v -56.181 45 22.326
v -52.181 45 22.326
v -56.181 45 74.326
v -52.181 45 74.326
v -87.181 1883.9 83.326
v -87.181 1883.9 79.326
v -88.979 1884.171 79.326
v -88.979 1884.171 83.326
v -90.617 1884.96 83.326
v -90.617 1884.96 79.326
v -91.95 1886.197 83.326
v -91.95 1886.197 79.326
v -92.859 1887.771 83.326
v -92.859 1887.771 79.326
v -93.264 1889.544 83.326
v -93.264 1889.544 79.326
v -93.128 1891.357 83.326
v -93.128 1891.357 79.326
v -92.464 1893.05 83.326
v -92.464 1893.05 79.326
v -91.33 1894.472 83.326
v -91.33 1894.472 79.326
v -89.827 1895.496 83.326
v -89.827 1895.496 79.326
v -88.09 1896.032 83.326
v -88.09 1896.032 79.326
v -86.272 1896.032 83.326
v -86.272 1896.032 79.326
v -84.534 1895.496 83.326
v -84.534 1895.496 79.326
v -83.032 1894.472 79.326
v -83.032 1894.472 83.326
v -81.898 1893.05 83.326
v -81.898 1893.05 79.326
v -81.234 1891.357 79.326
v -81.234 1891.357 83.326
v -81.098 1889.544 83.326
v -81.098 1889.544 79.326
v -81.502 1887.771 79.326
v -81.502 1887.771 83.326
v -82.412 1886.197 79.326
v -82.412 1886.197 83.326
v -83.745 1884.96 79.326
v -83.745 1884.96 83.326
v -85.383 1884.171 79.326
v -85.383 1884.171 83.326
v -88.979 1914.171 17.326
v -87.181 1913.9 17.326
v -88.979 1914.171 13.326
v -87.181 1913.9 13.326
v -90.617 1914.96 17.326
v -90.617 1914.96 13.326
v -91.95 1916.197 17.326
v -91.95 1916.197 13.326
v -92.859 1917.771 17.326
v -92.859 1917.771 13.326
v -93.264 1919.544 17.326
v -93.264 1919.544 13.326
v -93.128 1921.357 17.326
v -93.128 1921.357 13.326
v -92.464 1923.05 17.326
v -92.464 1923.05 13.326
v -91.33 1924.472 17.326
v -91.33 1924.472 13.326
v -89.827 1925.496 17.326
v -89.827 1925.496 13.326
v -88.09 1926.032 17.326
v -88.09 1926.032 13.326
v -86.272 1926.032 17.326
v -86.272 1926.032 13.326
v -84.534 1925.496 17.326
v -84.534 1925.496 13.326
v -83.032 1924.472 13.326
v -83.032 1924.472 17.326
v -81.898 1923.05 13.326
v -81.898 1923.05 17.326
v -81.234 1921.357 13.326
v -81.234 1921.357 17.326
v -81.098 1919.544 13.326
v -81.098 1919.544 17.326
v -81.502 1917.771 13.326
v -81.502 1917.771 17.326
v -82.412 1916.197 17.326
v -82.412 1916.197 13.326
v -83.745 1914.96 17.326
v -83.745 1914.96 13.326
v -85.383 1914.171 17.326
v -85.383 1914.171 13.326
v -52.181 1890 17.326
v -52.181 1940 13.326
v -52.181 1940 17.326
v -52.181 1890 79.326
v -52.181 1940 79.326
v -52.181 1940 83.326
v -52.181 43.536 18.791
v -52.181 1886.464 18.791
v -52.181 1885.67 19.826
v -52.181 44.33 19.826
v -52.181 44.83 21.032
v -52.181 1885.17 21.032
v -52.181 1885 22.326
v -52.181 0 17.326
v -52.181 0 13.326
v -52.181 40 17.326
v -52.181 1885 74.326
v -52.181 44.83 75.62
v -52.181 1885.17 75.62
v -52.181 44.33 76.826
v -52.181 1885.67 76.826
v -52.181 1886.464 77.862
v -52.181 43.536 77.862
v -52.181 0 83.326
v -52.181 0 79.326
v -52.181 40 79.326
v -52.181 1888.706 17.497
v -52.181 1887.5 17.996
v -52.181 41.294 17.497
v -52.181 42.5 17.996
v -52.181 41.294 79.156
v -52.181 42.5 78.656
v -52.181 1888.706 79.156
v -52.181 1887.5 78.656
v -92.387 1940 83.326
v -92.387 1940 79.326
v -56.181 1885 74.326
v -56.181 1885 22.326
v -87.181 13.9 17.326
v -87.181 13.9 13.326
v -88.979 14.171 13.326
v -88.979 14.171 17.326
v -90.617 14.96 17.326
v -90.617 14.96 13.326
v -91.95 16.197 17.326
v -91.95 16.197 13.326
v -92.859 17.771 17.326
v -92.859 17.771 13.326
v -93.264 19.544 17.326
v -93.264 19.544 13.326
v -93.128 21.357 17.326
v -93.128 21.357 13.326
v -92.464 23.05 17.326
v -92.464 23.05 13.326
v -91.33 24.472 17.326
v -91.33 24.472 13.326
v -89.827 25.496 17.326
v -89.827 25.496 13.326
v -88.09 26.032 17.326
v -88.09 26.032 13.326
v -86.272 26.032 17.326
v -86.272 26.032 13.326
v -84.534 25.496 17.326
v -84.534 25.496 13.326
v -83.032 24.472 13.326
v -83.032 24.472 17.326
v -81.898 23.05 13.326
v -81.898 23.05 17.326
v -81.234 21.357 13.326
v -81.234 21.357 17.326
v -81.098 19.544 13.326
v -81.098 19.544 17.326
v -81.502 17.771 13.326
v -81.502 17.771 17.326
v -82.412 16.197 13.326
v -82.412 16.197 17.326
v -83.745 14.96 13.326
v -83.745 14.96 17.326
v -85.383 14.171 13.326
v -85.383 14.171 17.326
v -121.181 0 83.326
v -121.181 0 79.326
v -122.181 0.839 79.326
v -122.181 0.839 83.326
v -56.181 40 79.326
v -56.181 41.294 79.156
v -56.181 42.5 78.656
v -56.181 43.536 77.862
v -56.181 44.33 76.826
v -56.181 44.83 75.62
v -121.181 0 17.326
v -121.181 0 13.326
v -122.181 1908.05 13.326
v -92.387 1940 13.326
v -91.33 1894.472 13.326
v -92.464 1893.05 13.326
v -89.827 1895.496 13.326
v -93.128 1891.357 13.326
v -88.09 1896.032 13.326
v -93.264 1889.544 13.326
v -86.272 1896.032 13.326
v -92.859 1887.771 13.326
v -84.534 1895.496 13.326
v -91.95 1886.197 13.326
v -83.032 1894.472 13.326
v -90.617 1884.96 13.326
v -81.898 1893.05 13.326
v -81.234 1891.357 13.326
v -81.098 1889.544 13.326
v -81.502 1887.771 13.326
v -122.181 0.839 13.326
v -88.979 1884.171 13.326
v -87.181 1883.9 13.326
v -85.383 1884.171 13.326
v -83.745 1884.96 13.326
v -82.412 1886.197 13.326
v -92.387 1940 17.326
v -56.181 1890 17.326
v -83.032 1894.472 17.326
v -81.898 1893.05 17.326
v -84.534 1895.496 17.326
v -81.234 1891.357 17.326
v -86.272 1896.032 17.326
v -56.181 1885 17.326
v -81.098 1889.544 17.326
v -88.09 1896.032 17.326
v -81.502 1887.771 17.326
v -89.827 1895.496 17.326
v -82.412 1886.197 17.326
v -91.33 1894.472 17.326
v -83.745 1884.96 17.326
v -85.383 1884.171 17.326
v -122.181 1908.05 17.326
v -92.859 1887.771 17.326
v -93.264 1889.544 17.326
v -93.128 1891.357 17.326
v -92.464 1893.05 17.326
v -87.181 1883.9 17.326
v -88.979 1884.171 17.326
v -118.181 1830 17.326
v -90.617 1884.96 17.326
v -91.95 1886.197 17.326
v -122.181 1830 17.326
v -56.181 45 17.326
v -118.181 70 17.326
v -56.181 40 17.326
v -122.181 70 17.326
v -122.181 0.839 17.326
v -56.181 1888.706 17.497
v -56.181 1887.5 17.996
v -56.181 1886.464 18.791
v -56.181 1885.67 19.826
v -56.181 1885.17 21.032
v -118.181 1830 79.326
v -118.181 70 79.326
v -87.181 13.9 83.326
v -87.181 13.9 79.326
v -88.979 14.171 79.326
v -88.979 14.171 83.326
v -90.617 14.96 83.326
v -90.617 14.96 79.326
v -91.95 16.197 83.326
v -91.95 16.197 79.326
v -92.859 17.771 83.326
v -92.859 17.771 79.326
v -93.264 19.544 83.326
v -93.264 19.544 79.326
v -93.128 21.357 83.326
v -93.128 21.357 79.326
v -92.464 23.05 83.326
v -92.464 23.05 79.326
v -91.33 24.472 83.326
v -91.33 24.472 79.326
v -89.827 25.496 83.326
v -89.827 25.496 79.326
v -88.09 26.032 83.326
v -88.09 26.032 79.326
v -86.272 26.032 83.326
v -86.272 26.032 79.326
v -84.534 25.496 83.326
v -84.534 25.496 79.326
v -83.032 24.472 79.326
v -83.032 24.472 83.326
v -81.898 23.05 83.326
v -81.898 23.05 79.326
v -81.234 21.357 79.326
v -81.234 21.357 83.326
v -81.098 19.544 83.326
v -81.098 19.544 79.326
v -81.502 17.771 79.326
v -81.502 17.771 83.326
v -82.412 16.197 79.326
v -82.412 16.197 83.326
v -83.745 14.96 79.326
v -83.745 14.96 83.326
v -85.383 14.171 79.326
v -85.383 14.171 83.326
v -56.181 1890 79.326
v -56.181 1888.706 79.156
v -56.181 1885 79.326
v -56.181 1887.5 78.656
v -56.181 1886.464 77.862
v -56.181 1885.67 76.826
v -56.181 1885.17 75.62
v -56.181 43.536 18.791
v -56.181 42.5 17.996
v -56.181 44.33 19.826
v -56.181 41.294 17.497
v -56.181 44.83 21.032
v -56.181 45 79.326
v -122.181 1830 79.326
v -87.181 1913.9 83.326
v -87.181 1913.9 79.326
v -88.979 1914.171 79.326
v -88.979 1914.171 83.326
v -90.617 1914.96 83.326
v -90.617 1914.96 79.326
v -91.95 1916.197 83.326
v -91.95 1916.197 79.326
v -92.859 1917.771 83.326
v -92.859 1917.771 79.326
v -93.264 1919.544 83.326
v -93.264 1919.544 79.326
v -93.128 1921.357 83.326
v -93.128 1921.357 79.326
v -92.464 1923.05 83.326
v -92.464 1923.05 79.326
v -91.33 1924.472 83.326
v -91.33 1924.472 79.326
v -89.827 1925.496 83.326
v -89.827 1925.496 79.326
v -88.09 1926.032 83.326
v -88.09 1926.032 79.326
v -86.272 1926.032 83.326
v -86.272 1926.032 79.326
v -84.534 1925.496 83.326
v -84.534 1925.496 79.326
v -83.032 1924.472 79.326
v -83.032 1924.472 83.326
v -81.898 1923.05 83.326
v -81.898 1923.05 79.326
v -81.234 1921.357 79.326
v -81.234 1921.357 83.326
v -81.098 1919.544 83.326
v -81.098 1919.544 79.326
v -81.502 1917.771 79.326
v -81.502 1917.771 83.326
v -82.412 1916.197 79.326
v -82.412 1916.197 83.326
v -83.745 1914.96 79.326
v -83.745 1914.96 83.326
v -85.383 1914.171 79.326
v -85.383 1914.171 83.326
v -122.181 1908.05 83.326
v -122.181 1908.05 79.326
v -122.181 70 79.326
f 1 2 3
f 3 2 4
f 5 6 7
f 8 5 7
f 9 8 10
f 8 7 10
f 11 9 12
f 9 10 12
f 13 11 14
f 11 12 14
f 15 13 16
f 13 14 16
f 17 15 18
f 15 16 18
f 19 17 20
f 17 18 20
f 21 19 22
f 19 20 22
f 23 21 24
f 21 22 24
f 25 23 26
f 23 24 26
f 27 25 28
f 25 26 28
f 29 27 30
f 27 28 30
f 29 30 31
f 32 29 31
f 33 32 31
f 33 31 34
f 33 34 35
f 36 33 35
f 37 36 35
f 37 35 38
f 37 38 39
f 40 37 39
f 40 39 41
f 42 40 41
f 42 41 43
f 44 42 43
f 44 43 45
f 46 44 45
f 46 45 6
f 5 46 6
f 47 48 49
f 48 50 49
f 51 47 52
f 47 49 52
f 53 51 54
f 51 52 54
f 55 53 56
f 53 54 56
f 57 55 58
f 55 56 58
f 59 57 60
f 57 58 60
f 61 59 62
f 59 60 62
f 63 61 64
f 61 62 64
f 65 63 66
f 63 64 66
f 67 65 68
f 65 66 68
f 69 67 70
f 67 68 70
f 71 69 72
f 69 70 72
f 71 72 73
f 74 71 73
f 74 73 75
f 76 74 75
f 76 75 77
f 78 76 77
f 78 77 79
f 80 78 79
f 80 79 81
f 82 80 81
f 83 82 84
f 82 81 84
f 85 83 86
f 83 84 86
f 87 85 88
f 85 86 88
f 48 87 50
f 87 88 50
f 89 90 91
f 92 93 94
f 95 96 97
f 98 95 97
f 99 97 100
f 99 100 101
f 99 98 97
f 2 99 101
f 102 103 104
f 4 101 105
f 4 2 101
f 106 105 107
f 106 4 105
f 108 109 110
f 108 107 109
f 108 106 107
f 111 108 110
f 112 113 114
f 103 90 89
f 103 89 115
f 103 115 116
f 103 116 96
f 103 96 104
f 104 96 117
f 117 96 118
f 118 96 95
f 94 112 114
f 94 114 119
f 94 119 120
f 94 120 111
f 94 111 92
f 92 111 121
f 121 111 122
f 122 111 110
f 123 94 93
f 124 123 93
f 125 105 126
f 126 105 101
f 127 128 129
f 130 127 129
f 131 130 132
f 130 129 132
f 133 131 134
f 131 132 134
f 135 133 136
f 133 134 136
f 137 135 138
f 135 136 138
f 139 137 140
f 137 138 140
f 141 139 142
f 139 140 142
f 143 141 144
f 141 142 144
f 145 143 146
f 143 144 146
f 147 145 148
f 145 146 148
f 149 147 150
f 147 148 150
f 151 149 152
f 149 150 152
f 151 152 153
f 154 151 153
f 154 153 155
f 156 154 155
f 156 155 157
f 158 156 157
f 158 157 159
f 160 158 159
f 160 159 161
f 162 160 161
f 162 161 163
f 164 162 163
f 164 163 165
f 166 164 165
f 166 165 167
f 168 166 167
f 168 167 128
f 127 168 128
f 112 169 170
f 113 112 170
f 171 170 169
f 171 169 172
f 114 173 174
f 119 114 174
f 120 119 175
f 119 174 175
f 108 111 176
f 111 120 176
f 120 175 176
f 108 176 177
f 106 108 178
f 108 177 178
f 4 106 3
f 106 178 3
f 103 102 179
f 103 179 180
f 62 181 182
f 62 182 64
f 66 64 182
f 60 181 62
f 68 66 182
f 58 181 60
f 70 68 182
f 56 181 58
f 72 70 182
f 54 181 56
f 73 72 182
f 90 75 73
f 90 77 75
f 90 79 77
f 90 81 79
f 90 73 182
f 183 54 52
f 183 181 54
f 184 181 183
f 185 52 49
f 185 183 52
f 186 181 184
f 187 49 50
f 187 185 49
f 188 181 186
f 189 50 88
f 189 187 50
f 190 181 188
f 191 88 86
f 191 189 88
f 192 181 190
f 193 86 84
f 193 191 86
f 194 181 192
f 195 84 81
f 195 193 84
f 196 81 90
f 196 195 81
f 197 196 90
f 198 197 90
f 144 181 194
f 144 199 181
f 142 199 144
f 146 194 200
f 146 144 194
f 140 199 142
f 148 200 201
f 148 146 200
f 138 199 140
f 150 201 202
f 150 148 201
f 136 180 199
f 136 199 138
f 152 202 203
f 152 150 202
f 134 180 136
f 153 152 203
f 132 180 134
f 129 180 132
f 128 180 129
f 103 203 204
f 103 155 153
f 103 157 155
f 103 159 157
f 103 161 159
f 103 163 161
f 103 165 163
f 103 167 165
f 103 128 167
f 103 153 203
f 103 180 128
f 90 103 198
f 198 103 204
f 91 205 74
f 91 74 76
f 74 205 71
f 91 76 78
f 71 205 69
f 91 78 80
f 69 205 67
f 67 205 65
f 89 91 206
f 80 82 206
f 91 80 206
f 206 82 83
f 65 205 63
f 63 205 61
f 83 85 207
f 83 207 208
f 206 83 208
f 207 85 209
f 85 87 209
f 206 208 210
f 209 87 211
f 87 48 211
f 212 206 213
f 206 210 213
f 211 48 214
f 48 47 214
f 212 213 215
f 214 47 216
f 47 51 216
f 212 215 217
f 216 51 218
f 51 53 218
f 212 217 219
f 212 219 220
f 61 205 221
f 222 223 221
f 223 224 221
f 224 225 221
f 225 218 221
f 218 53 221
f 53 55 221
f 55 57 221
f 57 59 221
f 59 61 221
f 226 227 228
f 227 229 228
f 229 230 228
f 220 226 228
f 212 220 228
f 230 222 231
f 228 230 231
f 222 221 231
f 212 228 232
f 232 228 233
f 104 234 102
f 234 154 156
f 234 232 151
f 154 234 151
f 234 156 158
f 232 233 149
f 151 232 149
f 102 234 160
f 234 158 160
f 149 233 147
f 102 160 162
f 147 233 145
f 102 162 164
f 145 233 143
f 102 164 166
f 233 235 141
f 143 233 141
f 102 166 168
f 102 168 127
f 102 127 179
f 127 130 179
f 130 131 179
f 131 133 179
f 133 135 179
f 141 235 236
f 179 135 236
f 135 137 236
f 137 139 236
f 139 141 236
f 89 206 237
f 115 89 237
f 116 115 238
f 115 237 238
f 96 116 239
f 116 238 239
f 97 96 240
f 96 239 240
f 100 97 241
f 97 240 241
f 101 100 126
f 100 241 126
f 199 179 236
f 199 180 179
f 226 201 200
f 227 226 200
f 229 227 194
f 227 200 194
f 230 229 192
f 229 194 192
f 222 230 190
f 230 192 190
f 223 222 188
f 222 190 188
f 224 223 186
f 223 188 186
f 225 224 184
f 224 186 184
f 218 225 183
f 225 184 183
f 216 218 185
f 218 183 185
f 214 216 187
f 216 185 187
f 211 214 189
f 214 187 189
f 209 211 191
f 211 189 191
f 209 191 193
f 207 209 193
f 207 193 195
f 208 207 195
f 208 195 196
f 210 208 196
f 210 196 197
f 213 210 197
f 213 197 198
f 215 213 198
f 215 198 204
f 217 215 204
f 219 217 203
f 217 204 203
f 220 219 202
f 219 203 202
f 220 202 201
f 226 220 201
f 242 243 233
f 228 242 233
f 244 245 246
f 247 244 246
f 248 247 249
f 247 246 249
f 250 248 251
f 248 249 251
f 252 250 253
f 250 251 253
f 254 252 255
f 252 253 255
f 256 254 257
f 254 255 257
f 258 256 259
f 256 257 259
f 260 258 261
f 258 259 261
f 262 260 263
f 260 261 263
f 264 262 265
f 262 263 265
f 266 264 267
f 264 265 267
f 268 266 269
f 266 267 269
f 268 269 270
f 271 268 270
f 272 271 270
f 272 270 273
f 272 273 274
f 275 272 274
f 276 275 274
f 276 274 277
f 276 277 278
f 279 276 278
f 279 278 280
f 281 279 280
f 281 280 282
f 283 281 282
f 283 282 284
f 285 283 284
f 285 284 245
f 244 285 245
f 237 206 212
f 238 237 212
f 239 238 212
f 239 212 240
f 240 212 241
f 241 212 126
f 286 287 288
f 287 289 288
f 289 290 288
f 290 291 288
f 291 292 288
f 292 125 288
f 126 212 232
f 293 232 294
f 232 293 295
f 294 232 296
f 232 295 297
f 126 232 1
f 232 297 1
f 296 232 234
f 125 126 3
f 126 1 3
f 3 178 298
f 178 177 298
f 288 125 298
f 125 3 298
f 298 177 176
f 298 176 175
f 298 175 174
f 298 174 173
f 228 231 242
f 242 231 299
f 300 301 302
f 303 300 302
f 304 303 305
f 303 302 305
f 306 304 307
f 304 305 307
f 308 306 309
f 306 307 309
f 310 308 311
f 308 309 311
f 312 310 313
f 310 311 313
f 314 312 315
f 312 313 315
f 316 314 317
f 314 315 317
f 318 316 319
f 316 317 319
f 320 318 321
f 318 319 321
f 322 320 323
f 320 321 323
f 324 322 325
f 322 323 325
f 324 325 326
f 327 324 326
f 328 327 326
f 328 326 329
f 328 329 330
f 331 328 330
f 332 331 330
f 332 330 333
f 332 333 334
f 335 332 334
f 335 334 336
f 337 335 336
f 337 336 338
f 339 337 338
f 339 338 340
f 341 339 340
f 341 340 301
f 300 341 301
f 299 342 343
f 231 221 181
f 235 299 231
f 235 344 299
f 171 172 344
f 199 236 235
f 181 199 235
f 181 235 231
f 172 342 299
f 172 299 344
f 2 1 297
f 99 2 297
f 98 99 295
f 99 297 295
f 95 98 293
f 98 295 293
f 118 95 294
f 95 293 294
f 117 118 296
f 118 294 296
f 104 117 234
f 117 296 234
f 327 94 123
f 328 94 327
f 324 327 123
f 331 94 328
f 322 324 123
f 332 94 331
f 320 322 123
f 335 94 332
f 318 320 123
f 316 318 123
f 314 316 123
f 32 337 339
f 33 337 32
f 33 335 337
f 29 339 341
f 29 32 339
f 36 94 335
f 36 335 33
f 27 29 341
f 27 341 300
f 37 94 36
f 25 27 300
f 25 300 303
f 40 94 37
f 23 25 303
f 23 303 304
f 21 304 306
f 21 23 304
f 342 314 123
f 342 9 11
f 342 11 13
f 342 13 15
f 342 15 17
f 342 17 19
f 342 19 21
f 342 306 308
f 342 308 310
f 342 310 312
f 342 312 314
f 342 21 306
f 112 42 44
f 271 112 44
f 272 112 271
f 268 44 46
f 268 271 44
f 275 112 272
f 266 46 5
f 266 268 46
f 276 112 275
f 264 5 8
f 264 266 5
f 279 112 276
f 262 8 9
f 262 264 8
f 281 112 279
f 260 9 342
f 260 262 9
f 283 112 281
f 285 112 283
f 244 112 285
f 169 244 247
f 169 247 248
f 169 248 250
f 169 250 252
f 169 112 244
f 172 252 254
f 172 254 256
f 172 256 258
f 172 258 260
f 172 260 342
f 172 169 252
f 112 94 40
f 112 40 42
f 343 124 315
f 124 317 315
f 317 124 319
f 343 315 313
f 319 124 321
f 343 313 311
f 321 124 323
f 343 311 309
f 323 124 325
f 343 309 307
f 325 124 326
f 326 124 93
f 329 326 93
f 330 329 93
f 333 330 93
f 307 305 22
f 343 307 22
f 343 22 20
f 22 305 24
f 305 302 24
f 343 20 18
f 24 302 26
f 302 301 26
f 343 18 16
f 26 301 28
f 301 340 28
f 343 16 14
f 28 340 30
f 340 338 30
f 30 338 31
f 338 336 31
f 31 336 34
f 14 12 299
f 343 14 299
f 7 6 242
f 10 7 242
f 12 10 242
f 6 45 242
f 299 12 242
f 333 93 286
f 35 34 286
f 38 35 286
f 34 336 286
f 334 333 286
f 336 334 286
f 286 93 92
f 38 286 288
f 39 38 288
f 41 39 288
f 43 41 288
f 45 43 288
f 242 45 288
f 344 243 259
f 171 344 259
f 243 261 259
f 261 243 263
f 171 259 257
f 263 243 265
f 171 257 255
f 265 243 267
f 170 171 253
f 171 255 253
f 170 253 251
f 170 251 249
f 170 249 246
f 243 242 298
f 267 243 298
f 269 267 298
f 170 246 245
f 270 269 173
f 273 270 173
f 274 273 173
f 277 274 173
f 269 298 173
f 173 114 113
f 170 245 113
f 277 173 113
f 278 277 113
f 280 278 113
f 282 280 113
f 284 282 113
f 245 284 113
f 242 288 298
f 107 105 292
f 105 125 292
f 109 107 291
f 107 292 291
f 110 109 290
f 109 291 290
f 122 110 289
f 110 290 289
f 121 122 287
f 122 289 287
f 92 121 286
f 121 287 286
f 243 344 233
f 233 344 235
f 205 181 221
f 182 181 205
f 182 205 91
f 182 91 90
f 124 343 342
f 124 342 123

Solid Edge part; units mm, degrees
sketch "Sketch1" plane through (0, 0, 0) normal (0, -1, 0) x (1, 0, 0)
  line L0 (-122.1808, 13.3262) -> (-52.1808, 13.3262)
  line L1 (-52.1808, 13.3262) -> (-52.1808, 83.3262)
  line L2 (-52.1808, 83.3262) -> (-122.1808, 83.3262)
  line L3 (-122.1808, 83.3262) -> (-122.1808, 13.3262)
  line L4 (-118.1808, 17.3262) -> (-56.1808, 17.3262)
  line L5 (-56.1808, 17.3262) -> (-56.1808, 79.3262)
  line L6 (-56.1808, 79.3262) -> (-118.1808, 79.3262)
  line L7 (-118.1808, 79.3262) -> (-118.1808, 17.3262)
  dimension "D1" = 70
  dimension "D2" = 70
  dimension "D3" = 4
  dimension "D4" = 4
extrude "Protrusion1" add sketch "Sketch1" against normal blind 1940
sketch "Sketch2" plane through (-87.1808, 1079, 13.3262) normal (0, 0, -1) x (0, -1, 0)
  circle A0 centre (-811, 0) radius 6.1
  circle A1 centre (-841, 0) radius 6.1
  circle A2 centre (1059, 0) radius 6.1
  dimension "D1" = 12.2
  dimension "D2" = 20
  dimension "D3" = 12.2
  dimension "D4" = 12.2
  dimension "D5" = 20
  dimension "D6" = 30
extrude "Cutout1" cut sketch "Sketch2" against normal through all
sketch "Sketch3" plane through (-52.1808, 1079, 63.3262) normal (1, 0, 0) x (0, -1, 0)
  line L0 (1034, -16) -> (1079, -16)
  line L1 (1079, -16) -> (1079, 46)
  line L2 (1079, 46) -> (1034, 46)
  line L3 (1034, 46) -> (1034, -16)
  line L4 (-861, -16) -> (-806, -16)
  line L5 (-806, -16) -> (-806, 46)
  line L6 (-806, 46) -> (-861, 46)
  line L7 (-861, 46) -> (-861, -16)
  dimension "D1" = 62
  dimension "D2" = 55
  dimension "D3" = 45
  dimension "D4" = 62
extrude "Cutout2" cut sketch "Sketch3" against normal up to next
sketch "Sketch4" plane through (-92.1808, 1005.1, 13.3262) normal (0, 0, -1) x (0, -1, 0)
  line L0 (-934.9, 30) -> (-902.95, 30)
  line L1 (-902.95, 30) -> (-934.9, 0.2062)
  line L2 (-934.9, 0.2062) -> (-934.9, 30)
  dimension "D1" = 29.7938
extrude "Cutout3" cut sketch "Sketch4" against normal through all
sketch "Sketch5" plane through (-92.1808, 1005.1, 13.3262) normal (0, 0, -1) x (0, 1, 0)
  line L0 (-1005.1, -29) -> (-1004.2609, -30)
  line L1 (-1004.2609, -30) -> (-1005.1, -30)
  line L2 (-1005.1, -30) -> (-1005.1, -29)
  dimension "D1" = 1
extrude "Cutout4" cut sketch "Sketch5" against normal through all
sketch "Sketch6" plane through (-122.1808, 957.9195, 48.3262) normal (-1, 0, 0) x (0, -1, 0)
  line L0 (-982.0805, -31) -> (-872.0805, -31)
  line L1 (-872.0805, -31) -> (-872.0805, 31)
  line L2 (-872.0805, 31) -> (-982.0805, 31)
  line L3 (-982.0805, 31) -> (-982.0805, -31)
  dimension "D1" = 62
  dimension "D2" = 110
extrude "Cutout5" cut sketch "Sketch6" against normal up to next
sketch "Sketch7" plane through (-122.1808, 957.9195, 48.3262) normal (-1, 0, 0) x (0, 1, 0)
  line L0 (-957.9195, -31) -> (-887.9195, -31)
  line L1 (-887.9195, -31) -> (-887.9195, 31)
  line L2 (-887.9195, 31) -> (-957.9195, 31)
  line L3 (-957.9195, 31) -> (-957.9195, -31)
  dimension "D1" = 62
  dimension "D2" = 70
extrude "Cutout6" cut sketch "Sketch7" against normal up to next
fillet "Round1" radius 5 4 edges at (-54.1808, 45, 79.3262) (-54.1808, 45, 17.3262) (-54.1808, 1885, 79.3262) (-54.1808, 1885, 17.3262)
properties material "Aluminum, 6061-T6"
